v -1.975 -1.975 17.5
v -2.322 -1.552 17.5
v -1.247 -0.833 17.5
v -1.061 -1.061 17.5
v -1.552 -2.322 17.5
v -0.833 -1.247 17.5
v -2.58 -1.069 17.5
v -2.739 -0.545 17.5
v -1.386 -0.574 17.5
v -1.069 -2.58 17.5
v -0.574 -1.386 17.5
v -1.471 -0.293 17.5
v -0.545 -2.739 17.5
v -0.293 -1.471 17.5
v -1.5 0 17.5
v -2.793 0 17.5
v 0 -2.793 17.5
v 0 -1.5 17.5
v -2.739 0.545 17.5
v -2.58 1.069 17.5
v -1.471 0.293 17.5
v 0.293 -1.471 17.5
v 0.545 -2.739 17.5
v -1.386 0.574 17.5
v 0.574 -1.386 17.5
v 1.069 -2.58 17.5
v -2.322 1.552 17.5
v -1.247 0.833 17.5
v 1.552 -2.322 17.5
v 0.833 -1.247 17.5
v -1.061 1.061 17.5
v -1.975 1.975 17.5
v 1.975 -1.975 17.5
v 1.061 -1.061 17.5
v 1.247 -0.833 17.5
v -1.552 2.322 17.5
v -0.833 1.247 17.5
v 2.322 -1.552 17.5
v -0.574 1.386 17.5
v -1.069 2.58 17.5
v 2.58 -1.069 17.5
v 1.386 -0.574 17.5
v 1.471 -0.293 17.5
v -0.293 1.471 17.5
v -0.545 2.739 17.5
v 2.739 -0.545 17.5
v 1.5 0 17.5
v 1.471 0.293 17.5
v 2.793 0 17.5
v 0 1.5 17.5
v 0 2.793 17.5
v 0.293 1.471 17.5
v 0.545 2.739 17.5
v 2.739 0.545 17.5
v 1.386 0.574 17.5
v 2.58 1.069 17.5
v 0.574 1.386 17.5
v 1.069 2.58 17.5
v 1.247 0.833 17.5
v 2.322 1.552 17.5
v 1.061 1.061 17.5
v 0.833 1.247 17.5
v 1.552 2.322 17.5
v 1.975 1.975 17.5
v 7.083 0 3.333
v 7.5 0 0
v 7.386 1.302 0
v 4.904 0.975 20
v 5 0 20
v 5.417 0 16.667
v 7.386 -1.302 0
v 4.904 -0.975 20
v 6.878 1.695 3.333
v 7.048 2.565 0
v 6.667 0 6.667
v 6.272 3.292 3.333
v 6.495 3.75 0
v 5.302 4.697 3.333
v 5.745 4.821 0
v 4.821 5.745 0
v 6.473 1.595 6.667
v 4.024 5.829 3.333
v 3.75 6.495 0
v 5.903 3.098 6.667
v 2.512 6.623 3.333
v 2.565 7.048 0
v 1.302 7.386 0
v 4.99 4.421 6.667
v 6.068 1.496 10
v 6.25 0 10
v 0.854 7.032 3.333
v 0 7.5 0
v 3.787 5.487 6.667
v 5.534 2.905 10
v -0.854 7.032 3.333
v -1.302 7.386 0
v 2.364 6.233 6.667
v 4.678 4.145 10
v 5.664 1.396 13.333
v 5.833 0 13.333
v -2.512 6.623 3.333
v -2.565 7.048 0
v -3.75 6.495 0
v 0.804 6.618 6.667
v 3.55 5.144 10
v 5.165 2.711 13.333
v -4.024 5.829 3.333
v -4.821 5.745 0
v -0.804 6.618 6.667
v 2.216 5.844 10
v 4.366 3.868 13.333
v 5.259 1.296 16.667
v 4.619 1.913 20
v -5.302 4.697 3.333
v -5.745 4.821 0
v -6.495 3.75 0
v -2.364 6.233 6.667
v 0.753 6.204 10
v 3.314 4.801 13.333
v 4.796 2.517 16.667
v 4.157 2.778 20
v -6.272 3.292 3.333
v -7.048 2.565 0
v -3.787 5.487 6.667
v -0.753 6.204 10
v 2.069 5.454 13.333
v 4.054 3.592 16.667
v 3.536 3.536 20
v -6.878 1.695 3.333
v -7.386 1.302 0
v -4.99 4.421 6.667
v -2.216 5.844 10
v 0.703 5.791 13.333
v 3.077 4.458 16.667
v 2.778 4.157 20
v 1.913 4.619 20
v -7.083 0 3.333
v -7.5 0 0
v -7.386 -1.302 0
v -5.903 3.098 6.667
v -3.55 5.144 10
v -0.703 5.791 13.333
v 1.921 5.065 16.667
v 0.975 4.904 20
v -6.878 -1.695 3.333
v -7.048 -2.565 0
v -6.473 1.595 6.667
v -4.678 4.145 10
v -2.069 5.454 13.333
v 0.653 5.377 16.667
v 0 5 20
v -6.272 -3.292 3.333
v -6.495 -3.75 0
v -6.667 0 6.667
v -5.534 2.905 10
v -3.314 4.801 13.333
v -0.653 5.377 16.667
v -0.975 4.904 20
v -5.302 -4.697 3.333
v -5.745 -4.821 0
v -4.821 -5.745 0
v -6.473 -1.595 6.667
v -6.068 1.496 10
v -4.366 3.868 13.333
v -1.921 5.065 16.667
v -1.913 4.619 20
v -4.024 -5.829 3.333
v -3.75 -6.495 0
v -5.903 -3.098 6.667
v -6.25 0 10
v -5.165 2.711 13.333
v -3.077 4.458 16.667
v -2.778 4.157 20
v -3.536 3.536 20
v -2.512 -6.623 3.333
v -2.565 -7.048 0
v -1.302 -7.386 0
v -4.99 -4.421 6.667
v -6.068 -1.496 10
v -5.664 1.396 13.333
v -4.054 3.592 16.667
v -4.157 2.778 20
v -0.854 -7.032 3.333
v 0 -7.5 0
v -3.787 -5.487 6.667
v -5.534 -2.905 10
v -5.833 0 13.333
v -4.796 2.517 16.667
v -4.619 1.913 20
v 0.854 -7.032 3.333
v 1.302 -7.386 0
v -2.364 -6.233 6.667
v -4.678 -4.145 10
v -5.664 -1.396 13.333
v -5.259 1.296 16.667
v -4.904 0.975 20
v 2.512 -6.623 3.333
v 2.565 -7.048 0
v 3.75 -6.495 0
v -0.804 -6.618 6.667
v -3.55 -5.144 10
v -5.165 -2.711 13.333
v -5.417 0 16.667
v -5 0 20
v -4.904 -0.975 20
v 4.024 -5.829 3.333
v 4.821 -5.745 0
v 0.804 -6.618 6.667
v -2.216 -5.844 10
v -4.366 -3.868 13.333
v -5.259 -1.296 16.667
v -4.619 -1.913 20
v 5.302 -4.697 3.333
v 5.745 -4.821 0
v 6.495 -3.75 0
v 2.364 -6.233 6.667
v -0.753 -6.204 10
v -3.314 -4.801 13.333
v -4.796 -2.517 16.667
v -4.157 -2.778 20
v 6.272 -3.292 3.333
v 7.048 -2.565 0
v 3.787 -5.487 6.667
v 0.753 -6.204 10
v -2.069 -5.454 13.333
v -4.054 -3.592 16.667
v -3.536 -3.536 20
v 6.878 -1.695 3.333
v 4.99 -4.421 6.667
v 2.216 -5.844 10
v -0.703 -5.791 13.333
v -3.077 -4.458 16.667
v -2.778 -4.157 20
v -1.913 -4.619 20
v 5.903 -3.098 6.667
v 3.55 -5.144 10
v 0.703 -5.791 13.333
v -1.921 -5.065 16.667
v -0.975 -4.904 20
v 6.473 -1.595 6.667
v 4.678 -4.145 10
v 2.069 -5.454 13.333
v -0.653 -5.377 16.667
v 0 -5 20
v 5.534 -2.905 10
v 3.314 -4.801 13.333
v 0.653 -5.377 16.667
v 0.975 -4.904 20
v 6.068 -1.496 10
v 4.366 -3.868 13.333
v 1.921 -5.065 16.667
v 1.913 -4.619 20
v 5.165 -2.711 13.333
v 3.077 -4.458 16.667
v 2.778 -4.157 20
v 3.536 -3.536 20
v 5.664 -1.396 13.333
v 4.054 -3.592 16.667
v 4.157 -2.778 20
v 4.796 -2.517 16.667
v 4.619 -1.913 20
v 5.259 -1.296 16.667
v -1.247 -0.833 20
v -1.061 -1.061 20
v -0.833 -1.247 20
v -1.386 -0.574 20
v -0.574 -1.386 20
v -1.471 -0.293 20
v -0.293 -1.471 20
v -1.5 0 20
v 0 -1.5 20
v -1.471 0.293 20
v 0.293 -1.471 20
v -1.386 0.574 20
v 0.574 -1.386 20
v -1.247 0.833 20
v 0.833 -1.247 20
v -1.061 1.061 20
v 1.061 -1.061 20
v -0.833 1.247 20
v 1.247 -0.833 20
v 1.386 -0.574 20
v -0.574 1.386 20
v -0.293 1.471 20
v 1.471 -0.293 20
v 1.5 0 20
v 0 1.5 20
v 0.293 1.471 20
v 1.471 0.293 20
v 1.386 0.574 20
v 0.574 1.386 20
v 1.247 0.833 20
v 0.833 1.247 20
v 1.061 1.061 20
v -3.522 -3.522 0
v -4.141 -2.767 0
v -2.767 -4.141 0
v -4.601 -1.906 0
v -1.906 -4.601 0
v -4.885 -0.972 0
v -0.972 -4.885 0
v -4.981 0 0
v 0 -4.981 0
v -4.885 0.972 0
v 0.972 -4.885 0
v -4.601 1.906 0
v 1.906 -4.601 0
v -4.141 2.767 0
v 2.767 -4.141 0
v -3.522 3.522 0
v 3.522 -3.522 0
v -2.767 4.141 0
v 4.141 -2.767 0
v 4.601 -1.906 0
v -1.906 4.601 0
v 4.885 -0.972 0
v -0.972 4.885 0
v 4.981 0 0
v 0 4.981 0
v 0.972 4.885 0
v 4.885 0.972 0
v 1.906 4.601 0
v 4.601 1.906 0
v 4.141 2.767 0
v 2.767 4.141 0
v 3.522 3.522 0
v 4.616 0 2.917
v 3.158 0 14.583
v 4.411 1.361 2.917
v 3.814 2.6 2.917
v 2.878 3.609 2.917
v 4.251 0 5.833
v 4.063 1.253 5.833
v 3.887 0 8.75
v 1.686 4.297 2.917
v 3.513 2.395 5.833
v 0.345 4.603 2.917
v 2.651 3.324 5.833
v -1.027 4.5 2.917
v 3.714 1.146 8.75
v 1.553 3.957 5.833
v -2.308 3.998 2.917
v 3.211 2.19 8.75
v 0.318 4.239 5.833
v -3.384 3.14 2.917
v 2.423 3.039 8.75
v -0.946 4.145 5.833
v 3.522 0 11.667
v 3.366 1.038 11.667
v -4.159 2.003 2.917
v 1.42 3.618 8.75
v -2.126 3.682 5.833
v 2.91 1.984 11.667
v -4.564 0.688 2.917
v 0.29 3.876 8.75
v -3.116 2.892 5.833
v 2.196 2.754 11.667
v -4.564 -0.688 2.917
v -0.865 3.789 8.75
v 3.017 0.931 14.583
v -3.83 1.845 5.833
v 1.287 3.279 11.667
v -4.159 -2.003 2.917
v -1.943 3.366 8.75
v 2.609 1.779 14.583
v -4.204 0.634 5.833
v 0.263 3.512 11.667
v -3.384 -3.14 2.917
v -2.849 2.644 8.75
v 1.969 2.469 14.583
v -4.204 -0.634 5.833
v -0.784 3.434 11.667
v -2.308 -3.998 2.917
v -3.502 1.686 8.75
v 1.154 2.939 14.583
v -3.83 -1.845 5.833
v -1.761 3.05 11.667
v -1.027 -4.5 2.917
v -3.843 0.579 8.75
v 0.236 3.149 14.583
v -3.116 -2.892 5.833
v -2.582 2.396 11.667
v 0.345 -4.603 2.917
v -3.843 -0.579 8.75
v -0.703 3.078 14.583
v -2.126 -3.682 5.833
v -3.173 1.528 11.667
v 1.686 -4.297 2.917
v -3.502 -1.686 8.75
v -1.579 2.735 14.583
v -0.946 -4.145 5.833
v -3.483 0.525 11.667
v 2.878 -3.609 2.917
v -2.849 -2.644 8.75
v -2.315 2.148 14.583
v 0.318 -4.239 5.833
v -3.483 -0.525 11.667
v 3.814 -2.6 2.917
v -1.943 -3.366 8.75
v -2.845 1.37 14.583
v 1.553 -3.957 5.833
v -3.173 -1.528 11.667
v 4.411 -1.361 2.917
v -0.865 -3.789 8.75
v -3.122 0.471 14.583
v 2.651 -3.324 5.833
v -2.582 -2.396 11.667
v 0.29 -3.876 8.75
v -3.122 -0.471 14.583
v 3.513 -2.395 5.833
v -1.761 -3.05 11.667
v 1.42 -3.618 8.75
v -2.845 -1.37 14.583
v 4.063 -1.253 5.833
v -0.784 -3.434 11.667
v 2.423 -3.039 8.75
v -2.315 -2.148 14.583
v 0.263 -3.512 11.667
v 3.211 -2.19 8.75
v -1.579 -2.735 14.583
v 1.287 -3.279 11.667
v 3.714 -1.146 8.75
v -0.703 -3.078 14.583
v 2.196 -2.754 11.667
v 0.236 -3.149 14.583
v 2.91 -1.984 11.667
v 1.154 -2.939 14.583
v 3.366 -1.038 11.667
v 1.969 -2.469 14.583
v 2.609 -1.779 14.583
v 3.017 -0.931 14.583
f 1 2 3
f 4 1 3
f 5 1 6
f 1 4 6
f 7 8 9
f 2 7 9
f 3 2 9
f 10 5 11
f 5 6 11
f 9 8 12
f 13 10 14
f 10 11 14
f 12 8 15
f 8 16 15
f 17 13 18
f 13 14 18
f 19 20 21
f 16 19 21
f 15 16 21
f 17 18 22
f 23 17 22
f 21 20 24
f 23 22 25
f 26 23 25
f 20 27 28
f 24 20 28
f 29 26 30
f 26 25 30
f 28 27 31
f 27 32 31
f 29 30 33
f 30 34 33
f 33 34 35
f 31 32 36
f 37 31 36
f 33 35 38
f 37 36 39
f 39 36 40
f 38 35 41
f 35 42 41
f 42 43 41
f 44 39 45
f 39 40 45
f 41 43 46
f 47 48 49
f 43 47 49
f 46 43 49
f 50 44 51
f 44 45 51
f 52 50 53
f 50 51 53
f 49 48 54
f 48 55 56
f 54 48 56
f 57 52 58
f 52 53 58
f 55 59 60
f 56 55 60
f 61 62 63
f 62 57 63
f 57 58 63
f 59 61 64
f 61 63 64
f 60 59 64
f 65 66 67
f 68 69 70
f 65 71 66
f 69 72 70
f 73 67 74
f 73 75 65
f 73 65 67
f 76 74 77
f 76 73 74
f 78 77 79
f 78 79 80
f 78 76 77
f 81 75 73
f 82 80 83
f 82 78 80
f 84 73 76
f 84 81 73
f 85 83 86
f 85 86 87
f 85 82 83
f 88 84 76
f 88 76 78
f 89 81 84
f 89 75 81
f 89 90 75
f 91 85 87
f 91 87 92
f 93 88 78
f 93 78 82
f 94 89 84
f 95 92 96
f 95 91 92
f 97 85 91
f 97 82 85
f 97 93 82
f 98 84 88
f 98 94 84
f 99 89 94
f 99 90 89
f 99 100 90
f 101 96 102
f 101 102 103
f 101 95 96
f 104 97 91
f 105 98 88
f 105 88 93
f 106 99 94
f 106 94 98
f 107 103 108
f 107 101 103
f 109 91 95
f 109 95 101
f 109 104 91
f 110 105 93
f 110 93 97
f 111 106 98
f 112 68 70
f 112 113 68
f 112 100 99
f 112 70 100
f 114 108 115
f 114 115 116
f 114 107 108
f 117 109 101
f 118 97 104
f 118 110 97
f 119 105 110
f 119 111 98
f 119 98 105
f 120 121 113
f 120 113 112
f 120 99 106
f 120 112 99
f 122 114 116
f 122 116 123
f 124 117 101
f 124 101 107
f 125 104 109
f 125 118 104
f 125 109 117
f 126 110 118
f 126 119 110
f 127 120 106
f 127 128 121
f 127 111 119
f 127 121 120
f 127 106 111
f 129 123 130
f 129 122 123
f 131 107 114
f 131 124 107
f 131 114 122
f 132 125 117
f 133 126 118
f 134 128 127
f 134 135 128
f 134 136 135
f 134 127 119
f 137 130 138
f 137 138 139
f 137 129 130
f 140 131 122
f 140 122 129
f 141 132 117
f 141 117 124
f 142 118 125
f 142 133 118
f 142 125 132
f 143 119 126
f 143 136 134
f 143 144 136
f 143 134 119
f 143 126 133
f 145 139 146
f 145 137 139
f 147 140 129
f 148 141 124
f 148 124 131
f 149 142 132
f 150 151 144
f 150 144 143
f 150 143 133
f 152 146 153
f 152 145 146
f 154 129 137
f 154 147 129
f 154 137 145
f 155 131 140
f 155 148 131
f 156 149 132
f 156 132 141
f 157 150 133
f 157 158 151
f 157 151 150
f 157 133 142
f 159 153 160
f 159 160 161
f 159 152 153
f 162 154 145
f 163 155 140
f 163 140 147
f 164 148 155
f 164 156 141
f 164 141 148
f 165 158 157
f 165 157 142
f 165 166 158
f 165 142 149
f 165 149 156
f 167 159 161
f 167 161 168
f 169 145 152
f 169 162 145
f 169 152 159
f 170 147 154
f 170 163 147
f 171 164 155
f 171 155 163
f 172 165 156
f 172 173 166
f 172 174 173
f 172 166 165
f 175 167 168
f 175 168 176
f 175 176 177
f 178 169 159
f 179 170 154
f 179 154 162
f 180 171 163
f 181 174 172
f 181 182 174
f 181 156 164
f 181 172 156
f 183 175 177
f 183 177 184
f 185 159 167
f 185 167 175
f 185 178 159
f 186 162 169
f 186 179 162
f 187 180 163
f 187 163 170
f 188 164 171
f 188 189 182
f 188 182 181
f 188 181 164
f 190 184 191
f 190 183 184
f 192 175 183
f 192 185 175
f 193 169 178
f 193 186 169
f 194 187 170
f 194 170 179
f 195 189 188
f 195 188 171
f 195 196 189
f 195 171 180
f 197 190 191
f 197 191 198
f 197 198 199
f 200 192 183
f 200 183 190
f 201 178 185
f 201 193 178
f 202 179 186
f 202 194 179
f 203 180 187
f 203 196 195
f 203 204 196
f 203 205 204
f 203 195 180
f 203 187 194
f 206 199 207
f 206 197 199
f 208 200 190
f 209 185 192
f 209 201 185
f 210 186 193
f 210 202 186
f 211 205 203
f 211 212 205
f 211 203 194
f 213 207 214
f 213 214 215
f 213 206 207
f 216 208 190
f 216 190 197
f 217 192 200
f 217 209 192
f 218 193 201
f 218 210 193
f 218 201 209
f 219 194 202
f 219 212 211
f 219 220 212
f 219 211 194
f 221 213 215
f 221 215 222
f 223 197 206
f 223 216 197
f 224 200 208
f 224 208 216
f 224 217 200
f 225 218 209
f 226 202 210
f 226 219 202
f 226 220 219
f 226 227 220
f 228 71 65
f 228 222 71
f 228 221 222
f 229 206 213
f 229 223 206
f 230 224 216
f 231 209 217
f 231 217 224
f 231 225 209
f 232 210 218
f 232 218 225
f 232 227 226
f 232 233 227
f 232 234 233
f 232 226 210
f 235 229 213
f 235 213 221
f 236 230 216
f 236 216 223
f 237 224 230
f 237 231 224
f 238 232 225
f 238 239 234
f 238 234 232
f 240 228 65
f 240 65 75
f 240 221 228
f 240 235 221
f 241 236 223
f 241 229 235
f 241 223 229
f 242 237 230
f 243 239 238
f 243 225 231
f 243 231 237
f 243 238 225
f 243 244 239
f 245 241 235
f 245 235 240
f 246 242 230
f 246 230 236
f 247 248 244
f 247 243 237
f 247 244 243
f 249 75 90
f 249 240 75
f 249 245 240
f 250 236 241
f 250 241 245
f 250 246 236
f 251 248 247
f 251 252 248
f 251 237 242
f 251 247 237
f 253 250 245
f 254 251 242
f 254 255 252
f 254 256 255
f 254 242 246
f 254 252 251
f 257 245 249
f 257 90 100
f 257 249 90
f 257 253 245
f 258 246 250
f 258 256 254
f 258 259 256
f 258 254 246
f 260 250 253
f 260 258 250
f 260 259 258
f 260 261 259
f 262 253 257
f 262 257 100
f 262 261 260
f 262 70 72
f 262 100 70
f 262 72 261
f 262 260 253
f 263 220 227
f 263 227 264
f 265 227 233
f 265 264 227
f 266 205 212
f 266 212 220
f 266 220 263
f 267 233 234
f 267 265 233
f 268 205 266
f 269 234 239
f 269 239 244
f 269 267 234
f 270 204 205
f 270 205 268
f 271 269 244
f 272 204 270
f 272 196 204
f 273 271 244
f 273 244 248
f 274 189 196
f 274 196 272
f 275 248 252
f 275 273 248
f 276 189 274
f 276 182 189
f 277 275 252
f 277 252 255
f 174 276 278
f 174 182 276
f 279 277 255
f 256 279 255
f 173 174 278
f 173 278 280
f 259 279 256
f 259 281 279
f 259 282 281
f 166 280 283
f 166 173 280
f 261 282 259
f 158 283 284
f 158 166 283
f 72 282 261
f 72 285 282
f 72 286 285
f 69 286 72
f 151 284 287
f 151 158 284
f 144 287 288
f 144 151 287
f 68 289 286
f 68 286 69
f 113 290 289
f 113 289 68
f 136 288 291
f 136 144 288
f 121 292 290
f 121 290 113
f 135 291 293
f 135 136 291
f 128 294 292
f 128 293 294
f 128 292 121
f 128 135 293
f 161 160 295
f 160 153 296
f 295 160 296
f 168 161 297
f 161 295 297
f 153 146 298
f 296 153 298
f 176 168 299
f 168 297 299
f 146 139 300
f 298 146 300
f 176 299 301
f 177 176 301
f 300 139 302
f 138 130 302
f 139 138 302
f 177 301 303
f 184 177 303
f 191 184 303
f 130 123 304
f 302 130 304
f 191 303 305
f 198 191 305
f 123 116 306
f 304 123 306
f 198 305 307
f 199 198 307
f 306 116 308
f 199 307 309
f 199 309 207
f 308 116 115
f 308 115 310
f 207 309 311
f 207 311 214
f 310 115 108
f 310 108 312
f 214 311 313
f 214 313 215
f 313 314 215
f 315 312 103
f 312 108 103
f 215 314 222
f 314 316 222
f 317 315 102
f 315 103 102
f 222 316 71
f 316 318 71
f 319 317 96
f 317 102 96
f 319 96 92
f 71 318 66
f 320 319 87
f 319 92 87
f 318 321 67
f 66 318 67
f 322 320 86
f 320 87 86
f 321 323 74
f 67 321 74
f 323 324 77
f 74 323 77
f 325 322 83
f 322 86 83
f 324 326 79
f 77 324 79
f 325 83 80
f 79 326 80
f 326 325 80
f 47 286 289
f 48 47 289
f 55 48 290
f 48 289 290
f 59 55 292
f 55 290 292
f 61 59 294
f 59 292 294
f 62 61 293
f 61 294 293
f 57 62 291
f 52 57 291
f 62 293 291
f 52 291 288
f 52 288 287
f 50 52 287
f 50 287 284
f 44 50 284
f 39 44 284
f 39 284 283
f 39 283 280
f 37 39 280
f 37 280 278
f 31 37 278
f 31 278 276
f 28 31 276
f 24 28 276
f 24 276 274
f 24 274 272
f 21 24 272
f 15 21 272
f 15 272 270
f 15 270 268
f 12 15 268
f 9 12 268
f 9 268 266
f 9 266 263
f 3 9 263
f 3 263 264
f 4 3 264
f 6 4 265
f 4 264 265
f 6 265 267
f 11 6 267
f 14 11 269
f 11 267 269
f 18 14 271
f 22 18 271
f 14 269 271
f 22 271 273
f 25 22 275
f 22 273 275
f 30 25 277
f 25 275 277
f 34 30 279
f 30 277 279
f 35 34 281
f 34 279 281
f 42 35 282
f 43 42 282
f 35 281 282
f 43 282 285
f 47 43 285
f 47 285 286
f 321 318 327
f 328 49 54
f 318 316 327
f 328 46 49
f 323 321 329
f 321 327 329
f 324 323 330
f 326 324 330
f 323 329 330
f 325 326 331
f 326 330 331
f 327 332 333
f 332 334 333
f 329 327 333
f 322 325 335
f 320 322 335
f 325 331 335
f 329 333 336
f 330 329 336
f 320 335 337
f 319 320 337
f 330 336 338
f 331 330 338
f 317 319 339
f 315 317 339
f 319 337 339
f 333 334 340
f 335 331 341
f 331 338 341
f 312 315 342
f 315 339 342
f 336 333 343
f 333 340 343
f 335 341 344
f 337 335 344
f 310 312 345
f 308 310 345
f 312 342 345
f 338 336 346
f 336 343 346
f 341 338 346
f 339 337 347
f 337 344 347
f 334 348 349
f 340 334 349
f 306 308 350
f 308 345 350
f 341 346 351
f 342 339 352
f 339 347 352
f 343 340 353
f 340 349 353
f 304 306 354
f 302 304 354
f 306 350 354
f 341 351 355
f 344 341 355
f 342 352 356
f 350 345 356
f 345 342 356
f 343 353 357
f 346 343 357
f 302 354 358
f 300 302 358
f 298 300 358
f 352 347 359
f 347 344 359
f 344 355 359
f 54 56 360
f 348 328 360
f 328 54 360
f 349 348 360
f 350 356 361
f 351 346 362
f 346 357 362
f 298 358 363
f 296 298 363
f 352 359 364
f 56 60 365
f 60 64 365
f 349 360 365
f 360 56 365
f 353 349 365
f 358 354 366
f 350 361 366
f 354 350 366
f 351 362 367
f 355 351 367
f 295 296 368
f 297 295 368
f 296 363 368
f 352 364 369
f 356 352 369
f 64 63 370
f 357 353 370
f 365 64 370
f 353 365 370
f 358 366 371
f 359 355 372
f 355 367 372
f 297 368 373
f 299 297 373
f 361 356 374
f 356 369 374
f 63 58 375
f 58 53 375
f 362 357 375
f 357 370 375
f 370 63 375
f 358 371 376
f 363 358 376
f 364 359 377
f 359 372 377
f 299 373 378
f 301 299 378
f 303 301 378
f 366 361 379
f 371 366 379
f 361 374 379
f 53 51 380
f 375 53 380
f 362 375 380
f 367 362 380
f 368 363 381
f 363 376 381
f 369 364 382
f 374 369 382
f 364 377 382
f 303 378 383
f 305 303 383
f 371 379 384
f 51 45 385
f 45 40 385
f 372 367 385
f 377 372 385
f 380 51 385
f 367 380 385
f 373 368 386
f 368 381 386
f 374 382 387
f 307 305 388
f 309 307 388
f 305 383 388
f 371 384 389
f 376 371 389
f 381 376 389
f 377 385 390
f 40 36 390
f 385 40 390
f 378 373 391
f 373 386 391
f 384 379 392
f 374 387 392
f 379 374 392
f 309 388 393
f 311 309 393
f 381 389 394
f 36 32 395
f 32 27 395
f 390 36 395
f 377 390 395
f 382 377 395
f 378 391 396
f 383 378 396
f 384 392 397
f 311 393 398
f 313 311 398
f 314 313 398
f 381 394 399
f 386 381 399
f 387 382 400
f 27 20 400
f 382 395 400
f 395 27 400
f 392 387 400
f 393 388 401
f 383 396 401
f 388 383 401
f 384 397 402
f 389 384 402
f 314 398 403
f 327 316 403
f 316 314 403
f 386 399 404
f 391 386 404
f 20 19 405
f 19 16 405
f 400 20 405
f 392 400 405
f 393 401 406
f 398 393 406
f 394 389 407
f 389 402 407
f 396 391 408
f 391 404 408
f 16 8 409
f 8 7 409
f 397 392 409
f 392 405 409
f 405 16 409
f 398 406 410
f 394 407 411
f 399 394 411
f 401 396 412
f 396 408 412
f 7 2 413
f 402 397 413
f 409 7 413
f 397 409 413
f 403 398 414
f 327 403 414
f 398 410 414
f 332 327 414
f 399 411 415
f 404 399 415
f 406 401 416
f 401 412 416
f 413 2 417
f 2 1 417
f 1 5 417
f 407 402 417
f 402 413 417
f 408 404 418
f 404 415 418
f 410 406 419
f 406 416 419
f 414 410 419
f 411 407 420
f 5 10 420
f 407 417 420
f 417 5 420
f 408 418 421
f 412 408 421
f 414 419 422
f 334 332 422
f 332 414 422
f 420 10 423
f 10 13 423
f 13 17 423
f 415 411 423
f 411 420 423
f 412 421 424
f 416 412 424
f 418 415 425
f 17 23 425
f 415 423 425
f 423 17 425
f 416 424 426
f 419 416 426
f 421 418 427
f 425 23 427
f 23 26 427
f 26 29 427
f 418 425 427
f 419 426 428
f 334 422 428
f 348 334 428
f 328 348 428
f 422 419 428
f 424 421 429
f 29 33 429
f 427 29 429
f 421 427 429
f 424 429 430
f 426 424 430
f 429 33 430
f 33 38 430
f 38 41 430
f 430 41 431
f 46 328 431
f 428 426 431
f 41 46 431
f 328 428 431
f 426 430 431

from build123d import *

# Parameters (mm, degrees)
F0_R     = 7.5
F2_R     = 5
F4_T     = -2.5
F5_R     = 1.5
F6_DEPTH = 25


with BuildPart() as f3:
    # F0 (on Top) → F3 section 0
    with BuildSketch(Plane.XY):
        Circle(F0_R)
    # F2 (on offset) → F3 section 1
    with BuildSketch(Plane.XY.offset(20)):
        Circle(F2_R)
    loft()

    # F4
    f4_openings = [f3.faces().sort_by_distance(p)[0] for p in [
        (0, 0, 0),
    ]]
    offset(amount=F4_T, openings=f4_openings, kind=Kind.INTERSECTION)

    # F5 (on face) → F6 (cut)
    with BuildSketch(Plane.XY.offset(20)):
        Circle(F5_R)
    extrude(amount=-F6_DEPTH, mode=Mode.SUBTRACT)


solid = f3.part
